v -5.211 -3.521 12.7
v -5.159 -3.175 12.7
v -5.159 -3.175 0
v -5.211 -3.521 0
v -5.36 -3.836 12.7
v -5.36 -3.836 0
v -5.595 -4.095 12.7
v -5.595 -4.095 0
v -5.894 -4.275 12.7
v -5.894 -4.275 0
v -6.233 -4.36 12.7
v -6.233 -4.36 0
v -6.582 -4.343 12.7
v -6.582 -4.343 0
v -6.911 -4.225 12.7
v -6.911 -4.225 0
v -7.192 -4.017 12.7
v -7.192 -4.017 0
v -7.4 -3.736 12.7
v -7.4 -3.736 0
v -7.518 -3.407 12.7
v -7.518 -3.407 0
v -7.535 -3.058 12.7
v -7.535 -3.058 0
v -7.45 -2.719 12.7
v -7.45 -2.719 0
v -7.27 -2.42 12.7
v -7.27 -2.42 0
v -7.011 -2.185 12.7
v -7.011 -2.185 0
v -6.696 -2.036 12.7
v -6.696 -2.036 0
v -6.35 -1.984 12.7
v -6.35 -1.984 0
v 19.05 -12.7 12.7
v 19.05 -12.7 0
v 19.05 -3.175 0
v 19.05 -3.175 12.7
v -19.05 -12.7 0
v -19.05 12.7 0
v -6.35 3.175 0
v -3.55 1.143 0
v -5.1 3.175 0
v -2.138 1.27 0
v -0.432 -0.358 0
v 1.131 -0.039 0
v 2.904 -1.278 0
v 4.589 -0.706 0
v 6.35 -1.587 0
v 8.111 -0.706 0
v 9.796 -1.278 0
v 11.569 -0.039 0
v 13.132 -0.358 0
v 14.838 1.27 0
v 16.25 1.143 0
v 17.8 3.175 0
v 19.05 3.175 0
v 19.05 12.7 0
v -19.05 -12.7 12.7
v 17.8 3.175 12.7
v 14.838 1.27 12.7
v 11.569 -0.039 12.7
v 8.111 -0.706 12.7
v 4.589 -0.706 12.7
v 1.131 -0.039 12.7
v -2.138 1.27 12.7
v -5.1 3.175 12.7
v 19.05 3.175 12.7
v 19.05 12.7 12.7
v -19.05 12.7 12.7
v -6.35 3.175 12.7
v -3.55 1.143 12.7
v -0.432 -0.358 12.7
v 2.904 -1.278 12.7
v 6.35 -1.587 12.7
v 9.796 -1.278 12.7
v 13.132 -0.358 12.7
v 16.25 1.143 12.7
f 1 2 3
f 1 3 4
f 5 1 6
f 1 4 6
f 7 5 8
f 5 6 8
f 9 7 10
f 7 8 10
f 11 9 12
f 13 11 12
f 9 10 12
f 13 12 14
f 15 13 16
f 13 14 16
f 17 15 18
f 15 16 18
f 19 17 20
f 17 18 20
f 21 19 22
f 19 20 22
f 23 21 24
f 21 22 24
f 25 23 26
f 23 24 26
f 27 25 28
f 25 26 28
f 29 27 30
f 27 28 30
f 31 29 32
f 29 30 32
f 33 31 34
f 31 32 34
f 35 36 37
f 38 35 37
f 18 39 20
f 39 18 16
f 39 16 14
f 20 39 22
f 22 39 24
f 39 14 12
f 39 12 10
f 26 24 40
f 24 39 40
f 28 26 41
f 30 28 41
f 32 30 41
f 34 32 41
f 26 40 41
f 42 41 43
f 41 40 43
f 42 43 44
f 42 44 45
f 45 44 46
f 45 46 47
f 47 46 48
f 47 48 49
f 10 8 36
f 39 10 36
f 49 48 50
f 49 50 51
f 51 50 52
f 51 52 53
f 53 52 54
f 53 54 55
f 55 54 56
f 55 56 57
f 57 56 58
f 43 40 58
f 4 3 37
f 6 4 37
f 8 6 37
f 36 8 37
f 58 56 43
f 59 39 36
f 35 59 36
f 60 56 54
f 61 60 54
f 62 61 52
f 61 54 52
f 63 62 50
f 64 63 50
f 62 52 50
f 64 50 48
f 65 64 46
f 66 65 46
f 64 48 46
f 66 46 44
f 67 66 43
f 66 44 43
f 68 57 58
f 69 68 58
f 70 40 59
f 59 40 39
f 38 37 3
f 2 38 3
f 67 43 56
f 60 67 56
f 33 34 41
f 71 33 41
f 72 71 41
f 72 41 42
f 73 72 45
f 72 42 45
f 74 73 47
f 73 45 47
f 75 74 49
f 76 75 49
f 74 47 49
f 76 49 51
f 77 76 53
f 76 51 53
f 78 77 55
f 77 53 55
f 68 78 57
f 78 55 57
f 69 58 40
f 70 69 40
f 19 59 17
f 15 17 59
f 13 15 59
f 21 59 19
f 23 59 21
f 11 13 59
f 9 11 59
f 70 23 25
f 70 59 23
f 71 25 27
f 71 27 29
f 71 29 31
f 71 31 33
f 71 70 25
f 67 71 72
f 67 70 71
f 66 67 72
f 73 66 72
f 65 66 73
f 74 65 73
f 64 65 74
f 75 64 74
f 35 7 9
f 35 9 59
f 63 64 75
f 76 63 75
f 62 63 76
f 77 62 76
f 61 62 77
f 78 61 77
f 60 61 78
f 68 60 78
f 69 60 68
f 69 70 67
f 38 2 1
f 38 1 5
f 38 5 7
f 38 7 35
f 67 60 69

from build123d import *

# Parameters (mm, degrees)
F1_DEPTH = 12.7


with BuildPart() as f1:
    # F0 (on Top) → F1 (new body)
    with BuildSketch(Plane.XY):
        with BuildLine():
            Line((-19.05, 12.7), (-19.05, -12.7))
            Line((-19.05, -12.7), (19.05, -12.7))
            Line((19.05, -12.7), (19.05, -3.175))
            Line((19.05, -3.175), (-5.159375, -3.175))
            ThreePointArc((-5.159375, -3.175), (-7.1918990114, -4.0168990114), (-6.35, -1.984375))
            Line((-6.35, -1.984375), (-6.35, 3.175))
            ThreePointArc((-6.35, 3.175), (-10.0319970522, 7.4955975212), (-12.2989024476, 12.7))
            Line((-12.2989024476, 12.7), (-19.05, 12.7))
        make_face()
        with BuildLine():
            Line((-11.4711365721, 12.7), (-12.2989024476, 12.7))
            ThreePointArc((-12.2989024476, 12.7), (-10.0319970522, 7.4955975212), (-6.35, 3.175))
            Line((-6.35, 3.175), (-5.0999496165, 3.175))
            ThreePointArc((-5.0999496165, 3.175), (-9.0409235562, 7.4322327931), (-11.4711365721, 12.7))
        make_face()
        with BuildLine():
            Line((19.05, 12.7), (-11.4711365721, 12.7))
            ThreePointArc((-11.4711365721, 12.7), (-9.0409235562, 7.4322327931), (-5.0999496165, 3.175))
            Line((-5.0999496165, 3.175), (17.7999496165, 3.175))
            ThreePointArc((17.7999496165, 3.175), (18.4369792221, 3.6996313607), (19.05, 4.2521259842))
            Line((19.05, 4.2521259842), (19.05, 12.7))
        make_face()
        with BuildLine():
            Line((17.7999496165, 3.175), (19.05, 3.175))
            Line((19.05, 3.175), (19.05, 4.2521259842))
            ThreePointArc((19.05, 4.2521259842), (18.4369792221, 3.6996313607), (17.7999496165, 3.175))
        make_face()
        with BuildLine():
            ThreePointArc((-6.35, 3.175), (6.35, -1.5875), (19.05, 3.175))
            Line((19.05, 3.175), (17.7999496165, 3.175))
            ThreePointArc((17.7999496165, 3.175), (6.35, -0.7895166667), (-5.0999496165, 3.175))
            Line((-5.0999496165, 3.175), (-6.35, 3.175))
        make_face()
    extrude(amount=F1_DEPTH)


solid = f1.part
